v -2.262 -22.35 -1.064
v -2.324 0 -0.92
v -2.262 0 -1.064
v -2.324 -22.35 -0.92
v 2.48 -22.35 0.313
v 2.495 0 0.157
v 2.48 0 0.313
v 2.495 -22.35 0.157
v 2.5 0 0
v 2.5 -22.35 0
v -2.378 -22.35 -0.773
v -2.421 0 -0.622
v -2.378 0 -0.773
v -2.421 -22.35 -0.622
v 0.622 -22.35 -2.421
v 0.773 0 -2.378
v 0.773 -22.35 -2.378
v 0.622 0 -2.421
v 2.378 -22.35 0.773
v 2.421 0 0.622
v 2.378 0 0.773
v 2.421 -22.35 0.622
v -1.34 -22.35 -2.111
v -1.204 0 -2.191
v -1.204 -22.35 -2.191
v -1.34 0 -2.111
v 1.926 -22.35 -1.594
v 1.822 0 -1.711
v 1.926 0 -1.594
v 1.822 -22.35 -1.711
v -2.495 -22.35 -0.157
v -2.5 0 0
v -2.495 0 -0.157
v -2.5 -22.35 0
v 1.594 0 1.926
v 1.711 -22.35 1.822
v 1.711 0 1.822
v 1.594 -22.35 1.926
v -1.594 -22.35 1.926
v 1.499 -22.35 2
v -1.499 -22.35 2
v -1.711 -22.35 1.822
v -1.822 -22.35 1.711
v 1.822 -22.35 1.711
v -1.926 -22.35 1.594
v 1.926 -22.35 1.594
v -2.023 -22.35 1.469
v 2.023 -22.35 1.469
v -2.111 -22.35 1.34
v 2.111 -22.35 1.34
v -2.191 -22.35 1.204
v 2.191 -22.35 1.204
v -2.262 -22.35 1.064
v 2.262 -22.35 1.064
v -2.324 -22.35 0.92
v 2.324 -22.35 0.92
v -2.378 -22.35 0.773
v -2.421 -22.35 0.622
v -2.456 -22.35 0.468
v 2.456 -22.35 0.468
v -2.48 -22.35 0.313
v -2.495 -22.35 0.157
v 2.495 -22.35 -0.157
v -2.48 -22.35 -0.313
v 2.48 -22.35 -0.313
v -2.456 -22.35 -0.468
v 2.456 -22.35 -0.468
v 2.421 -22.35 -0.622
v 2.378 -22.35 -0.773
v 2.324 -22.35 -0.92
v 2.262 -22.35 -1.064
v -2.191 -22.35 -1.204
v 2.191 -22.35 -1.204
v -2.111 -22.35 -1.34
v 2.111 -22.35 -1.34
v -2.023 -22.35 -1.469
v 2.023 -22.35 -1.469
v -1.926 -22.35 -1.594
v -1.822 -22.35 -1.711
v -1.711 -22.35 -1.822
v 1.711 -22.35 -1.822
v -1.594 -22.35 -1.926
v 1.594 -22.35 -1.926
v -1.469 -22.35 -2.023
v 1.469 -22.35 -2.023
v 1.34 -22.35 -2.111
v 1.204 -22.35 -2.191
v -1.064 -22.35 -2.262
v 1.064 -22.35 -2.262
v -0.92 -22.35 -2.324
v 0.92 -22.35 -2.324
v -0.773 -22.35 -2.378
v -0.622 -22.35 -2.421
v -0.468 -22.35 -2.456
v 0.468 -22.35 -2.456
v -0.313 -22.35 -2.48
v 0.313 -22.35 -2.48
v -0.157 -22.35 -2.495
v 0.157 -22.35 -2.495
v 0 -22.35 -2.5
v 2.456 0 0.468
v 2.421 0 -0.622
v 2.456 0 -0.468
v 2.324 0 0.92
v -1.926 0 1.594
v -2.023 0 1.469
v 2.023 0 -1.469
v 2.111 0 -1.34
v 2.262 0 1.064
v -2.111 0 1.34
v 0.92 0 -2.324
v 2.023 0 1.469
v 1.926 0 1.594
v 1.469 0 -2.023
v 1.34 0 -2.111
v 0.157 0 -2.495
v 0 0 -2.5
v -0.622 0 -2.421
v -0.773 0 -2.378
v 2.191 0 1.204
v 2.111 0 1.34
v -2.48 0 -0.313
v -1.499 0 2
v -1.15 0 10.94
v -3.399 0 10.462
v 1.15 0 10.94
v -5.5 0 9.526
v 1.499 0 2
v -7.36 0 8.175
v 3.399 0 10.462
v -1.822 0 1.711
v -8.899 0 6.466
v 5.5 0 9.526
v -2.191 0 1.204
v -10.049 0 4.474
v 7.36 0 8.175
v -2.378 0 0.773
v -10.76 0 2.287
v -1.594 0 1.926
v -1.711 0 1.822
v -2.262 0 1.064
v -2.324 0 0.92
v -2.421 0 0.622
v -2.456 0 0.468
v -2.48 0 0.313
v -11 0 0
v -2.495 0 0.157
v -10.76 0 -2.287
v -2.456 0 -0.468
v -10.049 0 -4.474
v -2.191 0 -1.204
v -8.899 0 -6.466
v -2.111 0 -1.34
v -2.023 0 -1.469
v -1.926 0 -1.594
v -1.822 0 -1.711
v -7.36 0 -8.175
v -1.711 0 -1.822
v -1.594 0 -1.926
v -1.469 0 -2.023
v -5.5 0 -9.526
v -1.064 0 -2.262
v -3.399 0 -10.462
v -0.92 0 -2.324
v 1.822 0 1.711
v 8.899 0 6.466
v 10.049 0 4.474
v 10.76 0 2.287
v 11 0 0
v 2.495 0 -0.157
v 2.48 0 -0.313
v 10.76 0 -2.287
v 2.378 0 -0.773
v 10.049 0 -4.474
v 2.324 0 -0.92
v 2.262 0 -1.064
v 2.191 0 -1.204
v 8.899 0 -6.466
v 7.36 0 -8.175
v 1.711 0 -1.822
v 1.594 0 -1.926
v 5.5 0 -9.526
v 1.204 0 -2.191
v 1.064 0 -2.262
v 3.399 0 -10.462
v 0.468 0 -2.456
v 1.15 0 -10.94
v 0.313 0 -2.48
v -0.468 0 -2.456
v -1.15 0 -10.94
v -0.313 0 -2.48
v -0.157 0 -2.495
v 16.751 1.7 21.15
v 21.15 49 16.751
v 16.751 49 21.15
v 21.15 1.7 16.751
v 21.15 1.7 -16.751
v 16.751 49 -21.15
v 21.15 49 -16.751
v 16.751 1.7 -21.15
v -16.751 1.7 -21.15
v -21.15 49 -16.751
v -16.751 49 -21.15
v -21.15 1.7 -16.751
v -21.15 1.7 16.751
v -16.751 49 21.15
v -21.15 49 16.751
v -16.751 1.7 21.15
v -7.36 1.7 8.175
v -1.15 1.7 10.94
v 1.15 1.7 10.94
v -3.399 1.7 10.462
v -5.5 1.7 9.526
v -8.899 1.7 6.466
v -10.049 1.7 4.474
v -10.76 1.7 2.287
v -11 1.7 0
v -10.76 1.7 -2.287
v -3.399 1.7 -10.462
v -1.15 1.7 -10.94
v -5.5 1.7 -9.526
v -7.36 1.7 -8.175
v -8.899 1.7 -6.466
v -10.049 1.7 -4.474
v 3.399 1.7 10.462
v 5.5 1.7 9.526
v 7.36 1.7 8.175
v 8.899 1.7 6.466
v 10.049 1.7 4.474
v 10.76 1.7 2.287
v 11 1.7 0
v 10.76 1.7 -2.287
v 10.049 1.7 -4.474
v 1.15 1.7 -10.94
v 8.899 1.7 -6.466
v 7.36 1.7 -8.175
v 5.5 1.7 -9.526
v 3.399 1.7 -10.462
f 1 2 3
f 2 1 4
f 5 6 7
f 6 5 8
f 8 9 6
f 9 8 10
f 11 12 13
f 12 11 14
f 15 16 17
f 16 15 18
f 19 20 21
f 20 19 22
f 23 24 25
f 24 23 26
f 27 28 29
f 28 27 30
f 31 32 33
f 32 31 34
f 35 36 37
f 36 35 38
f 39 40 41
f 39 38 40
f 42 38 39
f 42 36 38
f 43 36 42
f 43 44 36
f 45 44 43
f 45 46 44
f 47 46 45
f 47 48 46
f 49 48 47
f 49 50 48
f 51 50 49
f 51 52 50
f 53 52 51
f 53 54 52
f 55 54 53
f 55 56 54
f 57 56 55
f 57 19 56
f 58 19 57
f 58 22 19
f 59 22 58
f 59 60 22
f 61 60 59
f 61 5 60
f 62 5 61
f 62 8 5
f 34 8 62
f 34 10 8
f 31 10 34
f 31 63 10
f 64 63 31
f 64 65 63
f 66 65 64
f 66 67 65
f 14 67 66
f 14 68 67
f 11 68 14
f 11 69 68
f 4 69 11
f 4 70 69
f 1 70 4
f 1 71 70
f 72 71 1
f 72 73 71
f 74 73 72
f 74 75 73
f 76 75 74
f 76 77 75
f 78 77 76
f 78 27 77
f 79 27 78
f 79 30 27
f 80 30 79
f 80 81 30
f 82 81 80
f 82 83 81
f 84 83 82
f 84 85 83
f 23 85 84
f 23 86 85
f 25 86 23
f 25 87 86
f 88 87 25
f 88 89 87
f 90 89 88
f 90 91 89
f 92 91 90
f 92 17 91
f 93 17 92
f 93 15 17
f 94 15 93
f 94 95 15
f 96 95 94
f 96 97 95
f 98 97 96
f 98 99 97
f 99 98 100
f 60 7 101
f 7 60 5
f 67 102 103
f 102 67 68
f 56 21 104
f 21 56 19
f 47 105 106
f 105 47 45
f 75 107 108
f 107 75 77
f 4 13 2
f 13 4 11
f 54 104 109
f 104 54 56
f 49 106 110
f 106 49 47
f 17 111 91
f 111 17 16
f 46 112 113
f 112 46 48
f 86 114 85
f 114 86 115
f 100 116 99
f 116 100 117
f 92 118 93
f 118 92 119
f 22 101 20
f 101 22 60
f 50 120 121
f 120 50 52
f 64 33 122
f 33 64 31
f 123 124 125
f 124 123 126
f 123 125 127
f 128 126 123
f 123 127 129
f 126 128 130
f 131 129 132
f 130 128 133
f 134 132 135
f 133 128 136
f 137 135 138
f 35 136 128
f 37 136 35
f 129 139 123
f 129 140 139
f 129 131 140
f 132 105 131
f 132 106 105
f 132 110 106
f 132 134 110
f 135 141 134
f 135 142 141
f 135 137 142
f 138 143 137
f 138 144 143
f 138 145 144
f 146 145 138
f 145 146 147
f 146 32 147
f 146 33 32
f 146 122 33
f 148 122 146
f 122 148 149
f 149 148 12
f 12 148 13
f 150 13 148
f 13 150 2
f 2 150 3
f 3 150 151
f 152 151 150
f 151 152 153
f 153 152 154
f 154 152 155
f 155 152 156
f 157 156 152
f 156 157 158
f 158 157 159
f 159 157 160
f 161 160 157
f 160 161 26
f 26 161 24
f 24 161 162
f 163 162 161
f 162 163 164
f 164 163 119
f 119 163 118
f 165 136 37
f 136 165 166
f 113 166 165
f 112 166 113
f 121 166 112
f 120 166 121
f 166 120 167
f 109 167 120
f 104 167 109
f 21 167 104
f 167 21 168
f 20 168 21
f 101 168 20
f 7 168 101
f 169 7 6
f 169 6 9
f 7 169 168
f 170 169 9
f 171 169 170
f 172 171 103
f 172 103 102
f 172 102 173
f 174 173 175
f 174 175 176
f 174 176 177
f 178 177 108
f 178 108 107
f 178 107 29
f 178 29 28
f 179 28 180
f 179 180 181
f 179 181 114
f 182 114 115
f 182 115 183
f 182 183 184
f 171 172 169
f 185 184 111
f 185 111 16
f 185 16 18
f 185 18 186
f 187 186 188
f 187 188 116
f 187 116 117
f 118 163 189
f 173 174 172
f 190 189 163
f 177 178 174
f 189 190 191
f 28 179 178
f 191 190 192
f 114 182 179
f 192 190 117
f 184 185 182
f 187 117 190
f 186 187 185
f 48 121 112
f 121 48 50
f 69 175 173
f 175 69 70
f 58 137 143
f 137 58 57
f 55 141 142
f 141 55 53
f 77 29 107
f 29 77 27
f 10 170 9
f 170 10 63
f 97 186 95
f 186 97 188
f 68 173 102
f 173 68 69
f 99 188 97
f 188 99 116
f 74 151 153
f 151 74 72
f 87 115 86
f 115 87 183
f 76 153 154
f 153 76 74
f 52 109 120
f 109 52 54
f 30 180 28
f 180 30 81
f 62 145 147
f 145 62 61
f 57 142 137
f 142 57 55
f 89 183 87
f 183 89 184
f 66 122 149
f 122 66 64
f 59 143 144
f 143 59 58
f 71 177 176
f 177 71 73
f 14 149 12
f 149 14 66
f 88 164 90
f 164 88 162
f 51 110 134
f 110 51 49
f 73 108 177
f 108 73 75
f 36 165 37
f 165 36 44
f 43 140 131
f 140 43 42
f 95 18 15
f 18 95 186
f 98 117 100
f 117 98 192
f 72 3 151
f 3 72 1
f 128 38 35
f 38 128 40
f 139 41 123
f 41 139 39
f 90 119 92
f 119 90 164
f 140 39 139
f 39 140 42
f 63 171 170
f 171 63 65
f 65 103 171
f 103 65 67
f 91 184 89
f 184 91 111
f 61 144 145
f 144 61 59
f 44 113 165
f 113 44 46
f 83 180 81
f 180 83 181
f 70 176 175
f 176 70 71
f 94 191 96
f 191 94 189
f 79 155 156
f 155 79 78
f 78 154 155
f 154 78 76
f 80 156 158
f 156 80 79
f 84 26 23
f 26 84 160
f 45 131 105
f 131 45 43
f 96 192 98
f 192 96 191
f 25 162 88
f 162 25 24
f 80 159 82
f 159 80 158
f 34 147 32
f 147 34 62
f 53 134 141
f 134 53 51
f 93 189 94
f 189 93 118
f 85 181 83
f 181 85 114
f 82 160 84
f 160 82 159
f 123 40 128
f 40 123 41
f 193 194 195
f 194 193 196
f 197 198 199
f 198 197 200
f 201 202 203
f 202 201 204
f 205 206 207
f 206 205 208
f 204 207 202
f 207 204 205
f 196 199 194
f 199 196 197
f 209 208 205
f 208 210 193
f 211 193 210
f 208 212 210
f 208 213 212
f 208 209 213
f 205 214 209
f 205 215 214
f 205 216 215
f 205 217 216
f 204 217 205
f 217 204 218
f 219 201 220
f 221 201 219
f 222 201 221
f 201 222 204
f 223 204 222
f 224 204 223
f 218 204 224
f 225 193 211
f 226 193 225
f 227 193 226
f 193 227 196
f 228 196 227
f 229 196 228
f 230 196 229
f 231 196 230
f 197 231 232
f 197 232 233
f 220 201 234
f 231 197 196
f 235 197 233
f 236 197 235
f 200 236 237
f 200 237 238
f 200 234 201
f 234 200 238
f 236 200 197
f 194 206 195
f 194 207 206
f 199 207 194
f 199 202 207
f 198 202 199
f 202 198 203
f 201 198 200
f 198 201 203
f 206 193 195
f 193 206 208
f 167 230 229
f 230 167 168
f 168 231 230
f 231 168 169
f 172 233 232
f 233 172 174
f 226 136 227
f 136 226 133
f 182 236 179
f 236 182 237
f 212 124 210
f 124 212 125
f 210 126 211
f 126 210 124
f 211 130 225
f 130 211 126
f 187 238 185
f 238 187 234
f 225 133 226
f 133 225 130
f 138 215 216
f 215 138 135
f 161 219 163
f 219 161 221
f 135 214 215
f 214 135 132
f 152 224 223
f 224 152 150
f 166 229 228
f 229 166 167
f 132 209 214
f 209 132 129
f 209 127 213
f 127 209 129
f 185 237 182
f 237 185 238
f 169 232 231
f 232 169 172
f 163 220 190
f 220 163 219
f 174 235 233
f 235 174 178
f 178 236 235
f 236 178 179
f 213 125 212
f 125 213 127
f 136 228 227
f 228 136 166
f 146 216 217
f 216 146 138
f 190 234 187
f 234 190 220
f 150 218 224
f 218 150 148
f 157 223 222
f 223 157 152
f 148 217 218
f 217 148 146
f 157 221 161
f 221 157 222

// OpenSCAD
// file: ../params.scad
thickness=2;

// params for the central cylinder
inner_tube_length=50;
inner_tube_radius=20;

cylinder_radius_margin=0.5;

rear_axis_radius=3;
rear_axis_length=10;
rear_axis_padding=1;
front_axis_padding=1;

// motor
motor_total_length=71.35;
motor_block_length=47.3;
motor_block_side=42.3;
motor_block_flat_diameter=53.6;
motor_block_and_disk_length=49;
motor_disk_diameter=22;
motor_disk_length=motor_block_and_disk_length - motor_block_length;
motor_axis_length=motor_total_length - motor_block_and_disk_length;
motor_axis_diameter=5;
motor_axis_diameter_flat=4.5;
motor_axis_radius=motor_axis_diameter / 2;
motor_axis_radius_flat=motor_axis_diameter_flat - motor_axis_radius;

// motor holder
motor_support_width=50;
motor_support_height=51;
motor_support_length=54;
motor_support_hole_length=33.5;
motor_support_hole_width=4;
motor_support_motor_hole_dist_top=9.5;
motor_support_motor_hole_center_height=motor_support_height-motor_support_motor_hole_dist_top-motor_disk_diameter/2;


// params for holes in the central cylinder
hole_length=inner_tube_length-1;
hole_depth=inner_tube_radius-5;
hole_width=inner_tube_radius*0.7;



cylinder_radius_margin=0.5;

reservoirH=30;
// main file
include <../params.scad>



// for local tests only
motor();


module motor() {
    motor_axis();
    motor_block();
}

module motor_axis(radiusPadding=0) {
    difference() {
        rotate([90,0,0])
        cylinder(motor_axis_length,r=motor_axis_radius+radiusPadding,center=false,$fn=100);
        
        translate([-5,-motor_axis_length-1,motor_axis_radius_flat])
        cube([10,motor_axis_length+2,10],center=false);
    }
}

module motor_block() {
    rotate([90,0,0])
    translate([0,0,-motor_disk_length])
    cylinder(motor_disk_length,r=motor_disk_diameter/2,center=false,$fn=30);
        
    difference() {
        rotate([90,0,0])
        translate([-motor_block_side/2,-motor_block_side/2,-motor_block_length-motor_disk_length])
        cube([motor_block_side,motor_block_side,motor_block_length],center=false);
        
        for(i=[0:1:3]) {
            rotate([0,45+90*i,0])
            translate([0,0,motor_block_flat_diameter/2])
            motor_block_edge_cutter();
        }
    }
}

module motor_block_edge_cutter() {
    rotate([90,0,0])
    translate([-motor_block_side/2,0,-motor_block_length-motor_disk_length-1])
    cube([motor_block_side,10,motor_block_length+2],center=false);
}
